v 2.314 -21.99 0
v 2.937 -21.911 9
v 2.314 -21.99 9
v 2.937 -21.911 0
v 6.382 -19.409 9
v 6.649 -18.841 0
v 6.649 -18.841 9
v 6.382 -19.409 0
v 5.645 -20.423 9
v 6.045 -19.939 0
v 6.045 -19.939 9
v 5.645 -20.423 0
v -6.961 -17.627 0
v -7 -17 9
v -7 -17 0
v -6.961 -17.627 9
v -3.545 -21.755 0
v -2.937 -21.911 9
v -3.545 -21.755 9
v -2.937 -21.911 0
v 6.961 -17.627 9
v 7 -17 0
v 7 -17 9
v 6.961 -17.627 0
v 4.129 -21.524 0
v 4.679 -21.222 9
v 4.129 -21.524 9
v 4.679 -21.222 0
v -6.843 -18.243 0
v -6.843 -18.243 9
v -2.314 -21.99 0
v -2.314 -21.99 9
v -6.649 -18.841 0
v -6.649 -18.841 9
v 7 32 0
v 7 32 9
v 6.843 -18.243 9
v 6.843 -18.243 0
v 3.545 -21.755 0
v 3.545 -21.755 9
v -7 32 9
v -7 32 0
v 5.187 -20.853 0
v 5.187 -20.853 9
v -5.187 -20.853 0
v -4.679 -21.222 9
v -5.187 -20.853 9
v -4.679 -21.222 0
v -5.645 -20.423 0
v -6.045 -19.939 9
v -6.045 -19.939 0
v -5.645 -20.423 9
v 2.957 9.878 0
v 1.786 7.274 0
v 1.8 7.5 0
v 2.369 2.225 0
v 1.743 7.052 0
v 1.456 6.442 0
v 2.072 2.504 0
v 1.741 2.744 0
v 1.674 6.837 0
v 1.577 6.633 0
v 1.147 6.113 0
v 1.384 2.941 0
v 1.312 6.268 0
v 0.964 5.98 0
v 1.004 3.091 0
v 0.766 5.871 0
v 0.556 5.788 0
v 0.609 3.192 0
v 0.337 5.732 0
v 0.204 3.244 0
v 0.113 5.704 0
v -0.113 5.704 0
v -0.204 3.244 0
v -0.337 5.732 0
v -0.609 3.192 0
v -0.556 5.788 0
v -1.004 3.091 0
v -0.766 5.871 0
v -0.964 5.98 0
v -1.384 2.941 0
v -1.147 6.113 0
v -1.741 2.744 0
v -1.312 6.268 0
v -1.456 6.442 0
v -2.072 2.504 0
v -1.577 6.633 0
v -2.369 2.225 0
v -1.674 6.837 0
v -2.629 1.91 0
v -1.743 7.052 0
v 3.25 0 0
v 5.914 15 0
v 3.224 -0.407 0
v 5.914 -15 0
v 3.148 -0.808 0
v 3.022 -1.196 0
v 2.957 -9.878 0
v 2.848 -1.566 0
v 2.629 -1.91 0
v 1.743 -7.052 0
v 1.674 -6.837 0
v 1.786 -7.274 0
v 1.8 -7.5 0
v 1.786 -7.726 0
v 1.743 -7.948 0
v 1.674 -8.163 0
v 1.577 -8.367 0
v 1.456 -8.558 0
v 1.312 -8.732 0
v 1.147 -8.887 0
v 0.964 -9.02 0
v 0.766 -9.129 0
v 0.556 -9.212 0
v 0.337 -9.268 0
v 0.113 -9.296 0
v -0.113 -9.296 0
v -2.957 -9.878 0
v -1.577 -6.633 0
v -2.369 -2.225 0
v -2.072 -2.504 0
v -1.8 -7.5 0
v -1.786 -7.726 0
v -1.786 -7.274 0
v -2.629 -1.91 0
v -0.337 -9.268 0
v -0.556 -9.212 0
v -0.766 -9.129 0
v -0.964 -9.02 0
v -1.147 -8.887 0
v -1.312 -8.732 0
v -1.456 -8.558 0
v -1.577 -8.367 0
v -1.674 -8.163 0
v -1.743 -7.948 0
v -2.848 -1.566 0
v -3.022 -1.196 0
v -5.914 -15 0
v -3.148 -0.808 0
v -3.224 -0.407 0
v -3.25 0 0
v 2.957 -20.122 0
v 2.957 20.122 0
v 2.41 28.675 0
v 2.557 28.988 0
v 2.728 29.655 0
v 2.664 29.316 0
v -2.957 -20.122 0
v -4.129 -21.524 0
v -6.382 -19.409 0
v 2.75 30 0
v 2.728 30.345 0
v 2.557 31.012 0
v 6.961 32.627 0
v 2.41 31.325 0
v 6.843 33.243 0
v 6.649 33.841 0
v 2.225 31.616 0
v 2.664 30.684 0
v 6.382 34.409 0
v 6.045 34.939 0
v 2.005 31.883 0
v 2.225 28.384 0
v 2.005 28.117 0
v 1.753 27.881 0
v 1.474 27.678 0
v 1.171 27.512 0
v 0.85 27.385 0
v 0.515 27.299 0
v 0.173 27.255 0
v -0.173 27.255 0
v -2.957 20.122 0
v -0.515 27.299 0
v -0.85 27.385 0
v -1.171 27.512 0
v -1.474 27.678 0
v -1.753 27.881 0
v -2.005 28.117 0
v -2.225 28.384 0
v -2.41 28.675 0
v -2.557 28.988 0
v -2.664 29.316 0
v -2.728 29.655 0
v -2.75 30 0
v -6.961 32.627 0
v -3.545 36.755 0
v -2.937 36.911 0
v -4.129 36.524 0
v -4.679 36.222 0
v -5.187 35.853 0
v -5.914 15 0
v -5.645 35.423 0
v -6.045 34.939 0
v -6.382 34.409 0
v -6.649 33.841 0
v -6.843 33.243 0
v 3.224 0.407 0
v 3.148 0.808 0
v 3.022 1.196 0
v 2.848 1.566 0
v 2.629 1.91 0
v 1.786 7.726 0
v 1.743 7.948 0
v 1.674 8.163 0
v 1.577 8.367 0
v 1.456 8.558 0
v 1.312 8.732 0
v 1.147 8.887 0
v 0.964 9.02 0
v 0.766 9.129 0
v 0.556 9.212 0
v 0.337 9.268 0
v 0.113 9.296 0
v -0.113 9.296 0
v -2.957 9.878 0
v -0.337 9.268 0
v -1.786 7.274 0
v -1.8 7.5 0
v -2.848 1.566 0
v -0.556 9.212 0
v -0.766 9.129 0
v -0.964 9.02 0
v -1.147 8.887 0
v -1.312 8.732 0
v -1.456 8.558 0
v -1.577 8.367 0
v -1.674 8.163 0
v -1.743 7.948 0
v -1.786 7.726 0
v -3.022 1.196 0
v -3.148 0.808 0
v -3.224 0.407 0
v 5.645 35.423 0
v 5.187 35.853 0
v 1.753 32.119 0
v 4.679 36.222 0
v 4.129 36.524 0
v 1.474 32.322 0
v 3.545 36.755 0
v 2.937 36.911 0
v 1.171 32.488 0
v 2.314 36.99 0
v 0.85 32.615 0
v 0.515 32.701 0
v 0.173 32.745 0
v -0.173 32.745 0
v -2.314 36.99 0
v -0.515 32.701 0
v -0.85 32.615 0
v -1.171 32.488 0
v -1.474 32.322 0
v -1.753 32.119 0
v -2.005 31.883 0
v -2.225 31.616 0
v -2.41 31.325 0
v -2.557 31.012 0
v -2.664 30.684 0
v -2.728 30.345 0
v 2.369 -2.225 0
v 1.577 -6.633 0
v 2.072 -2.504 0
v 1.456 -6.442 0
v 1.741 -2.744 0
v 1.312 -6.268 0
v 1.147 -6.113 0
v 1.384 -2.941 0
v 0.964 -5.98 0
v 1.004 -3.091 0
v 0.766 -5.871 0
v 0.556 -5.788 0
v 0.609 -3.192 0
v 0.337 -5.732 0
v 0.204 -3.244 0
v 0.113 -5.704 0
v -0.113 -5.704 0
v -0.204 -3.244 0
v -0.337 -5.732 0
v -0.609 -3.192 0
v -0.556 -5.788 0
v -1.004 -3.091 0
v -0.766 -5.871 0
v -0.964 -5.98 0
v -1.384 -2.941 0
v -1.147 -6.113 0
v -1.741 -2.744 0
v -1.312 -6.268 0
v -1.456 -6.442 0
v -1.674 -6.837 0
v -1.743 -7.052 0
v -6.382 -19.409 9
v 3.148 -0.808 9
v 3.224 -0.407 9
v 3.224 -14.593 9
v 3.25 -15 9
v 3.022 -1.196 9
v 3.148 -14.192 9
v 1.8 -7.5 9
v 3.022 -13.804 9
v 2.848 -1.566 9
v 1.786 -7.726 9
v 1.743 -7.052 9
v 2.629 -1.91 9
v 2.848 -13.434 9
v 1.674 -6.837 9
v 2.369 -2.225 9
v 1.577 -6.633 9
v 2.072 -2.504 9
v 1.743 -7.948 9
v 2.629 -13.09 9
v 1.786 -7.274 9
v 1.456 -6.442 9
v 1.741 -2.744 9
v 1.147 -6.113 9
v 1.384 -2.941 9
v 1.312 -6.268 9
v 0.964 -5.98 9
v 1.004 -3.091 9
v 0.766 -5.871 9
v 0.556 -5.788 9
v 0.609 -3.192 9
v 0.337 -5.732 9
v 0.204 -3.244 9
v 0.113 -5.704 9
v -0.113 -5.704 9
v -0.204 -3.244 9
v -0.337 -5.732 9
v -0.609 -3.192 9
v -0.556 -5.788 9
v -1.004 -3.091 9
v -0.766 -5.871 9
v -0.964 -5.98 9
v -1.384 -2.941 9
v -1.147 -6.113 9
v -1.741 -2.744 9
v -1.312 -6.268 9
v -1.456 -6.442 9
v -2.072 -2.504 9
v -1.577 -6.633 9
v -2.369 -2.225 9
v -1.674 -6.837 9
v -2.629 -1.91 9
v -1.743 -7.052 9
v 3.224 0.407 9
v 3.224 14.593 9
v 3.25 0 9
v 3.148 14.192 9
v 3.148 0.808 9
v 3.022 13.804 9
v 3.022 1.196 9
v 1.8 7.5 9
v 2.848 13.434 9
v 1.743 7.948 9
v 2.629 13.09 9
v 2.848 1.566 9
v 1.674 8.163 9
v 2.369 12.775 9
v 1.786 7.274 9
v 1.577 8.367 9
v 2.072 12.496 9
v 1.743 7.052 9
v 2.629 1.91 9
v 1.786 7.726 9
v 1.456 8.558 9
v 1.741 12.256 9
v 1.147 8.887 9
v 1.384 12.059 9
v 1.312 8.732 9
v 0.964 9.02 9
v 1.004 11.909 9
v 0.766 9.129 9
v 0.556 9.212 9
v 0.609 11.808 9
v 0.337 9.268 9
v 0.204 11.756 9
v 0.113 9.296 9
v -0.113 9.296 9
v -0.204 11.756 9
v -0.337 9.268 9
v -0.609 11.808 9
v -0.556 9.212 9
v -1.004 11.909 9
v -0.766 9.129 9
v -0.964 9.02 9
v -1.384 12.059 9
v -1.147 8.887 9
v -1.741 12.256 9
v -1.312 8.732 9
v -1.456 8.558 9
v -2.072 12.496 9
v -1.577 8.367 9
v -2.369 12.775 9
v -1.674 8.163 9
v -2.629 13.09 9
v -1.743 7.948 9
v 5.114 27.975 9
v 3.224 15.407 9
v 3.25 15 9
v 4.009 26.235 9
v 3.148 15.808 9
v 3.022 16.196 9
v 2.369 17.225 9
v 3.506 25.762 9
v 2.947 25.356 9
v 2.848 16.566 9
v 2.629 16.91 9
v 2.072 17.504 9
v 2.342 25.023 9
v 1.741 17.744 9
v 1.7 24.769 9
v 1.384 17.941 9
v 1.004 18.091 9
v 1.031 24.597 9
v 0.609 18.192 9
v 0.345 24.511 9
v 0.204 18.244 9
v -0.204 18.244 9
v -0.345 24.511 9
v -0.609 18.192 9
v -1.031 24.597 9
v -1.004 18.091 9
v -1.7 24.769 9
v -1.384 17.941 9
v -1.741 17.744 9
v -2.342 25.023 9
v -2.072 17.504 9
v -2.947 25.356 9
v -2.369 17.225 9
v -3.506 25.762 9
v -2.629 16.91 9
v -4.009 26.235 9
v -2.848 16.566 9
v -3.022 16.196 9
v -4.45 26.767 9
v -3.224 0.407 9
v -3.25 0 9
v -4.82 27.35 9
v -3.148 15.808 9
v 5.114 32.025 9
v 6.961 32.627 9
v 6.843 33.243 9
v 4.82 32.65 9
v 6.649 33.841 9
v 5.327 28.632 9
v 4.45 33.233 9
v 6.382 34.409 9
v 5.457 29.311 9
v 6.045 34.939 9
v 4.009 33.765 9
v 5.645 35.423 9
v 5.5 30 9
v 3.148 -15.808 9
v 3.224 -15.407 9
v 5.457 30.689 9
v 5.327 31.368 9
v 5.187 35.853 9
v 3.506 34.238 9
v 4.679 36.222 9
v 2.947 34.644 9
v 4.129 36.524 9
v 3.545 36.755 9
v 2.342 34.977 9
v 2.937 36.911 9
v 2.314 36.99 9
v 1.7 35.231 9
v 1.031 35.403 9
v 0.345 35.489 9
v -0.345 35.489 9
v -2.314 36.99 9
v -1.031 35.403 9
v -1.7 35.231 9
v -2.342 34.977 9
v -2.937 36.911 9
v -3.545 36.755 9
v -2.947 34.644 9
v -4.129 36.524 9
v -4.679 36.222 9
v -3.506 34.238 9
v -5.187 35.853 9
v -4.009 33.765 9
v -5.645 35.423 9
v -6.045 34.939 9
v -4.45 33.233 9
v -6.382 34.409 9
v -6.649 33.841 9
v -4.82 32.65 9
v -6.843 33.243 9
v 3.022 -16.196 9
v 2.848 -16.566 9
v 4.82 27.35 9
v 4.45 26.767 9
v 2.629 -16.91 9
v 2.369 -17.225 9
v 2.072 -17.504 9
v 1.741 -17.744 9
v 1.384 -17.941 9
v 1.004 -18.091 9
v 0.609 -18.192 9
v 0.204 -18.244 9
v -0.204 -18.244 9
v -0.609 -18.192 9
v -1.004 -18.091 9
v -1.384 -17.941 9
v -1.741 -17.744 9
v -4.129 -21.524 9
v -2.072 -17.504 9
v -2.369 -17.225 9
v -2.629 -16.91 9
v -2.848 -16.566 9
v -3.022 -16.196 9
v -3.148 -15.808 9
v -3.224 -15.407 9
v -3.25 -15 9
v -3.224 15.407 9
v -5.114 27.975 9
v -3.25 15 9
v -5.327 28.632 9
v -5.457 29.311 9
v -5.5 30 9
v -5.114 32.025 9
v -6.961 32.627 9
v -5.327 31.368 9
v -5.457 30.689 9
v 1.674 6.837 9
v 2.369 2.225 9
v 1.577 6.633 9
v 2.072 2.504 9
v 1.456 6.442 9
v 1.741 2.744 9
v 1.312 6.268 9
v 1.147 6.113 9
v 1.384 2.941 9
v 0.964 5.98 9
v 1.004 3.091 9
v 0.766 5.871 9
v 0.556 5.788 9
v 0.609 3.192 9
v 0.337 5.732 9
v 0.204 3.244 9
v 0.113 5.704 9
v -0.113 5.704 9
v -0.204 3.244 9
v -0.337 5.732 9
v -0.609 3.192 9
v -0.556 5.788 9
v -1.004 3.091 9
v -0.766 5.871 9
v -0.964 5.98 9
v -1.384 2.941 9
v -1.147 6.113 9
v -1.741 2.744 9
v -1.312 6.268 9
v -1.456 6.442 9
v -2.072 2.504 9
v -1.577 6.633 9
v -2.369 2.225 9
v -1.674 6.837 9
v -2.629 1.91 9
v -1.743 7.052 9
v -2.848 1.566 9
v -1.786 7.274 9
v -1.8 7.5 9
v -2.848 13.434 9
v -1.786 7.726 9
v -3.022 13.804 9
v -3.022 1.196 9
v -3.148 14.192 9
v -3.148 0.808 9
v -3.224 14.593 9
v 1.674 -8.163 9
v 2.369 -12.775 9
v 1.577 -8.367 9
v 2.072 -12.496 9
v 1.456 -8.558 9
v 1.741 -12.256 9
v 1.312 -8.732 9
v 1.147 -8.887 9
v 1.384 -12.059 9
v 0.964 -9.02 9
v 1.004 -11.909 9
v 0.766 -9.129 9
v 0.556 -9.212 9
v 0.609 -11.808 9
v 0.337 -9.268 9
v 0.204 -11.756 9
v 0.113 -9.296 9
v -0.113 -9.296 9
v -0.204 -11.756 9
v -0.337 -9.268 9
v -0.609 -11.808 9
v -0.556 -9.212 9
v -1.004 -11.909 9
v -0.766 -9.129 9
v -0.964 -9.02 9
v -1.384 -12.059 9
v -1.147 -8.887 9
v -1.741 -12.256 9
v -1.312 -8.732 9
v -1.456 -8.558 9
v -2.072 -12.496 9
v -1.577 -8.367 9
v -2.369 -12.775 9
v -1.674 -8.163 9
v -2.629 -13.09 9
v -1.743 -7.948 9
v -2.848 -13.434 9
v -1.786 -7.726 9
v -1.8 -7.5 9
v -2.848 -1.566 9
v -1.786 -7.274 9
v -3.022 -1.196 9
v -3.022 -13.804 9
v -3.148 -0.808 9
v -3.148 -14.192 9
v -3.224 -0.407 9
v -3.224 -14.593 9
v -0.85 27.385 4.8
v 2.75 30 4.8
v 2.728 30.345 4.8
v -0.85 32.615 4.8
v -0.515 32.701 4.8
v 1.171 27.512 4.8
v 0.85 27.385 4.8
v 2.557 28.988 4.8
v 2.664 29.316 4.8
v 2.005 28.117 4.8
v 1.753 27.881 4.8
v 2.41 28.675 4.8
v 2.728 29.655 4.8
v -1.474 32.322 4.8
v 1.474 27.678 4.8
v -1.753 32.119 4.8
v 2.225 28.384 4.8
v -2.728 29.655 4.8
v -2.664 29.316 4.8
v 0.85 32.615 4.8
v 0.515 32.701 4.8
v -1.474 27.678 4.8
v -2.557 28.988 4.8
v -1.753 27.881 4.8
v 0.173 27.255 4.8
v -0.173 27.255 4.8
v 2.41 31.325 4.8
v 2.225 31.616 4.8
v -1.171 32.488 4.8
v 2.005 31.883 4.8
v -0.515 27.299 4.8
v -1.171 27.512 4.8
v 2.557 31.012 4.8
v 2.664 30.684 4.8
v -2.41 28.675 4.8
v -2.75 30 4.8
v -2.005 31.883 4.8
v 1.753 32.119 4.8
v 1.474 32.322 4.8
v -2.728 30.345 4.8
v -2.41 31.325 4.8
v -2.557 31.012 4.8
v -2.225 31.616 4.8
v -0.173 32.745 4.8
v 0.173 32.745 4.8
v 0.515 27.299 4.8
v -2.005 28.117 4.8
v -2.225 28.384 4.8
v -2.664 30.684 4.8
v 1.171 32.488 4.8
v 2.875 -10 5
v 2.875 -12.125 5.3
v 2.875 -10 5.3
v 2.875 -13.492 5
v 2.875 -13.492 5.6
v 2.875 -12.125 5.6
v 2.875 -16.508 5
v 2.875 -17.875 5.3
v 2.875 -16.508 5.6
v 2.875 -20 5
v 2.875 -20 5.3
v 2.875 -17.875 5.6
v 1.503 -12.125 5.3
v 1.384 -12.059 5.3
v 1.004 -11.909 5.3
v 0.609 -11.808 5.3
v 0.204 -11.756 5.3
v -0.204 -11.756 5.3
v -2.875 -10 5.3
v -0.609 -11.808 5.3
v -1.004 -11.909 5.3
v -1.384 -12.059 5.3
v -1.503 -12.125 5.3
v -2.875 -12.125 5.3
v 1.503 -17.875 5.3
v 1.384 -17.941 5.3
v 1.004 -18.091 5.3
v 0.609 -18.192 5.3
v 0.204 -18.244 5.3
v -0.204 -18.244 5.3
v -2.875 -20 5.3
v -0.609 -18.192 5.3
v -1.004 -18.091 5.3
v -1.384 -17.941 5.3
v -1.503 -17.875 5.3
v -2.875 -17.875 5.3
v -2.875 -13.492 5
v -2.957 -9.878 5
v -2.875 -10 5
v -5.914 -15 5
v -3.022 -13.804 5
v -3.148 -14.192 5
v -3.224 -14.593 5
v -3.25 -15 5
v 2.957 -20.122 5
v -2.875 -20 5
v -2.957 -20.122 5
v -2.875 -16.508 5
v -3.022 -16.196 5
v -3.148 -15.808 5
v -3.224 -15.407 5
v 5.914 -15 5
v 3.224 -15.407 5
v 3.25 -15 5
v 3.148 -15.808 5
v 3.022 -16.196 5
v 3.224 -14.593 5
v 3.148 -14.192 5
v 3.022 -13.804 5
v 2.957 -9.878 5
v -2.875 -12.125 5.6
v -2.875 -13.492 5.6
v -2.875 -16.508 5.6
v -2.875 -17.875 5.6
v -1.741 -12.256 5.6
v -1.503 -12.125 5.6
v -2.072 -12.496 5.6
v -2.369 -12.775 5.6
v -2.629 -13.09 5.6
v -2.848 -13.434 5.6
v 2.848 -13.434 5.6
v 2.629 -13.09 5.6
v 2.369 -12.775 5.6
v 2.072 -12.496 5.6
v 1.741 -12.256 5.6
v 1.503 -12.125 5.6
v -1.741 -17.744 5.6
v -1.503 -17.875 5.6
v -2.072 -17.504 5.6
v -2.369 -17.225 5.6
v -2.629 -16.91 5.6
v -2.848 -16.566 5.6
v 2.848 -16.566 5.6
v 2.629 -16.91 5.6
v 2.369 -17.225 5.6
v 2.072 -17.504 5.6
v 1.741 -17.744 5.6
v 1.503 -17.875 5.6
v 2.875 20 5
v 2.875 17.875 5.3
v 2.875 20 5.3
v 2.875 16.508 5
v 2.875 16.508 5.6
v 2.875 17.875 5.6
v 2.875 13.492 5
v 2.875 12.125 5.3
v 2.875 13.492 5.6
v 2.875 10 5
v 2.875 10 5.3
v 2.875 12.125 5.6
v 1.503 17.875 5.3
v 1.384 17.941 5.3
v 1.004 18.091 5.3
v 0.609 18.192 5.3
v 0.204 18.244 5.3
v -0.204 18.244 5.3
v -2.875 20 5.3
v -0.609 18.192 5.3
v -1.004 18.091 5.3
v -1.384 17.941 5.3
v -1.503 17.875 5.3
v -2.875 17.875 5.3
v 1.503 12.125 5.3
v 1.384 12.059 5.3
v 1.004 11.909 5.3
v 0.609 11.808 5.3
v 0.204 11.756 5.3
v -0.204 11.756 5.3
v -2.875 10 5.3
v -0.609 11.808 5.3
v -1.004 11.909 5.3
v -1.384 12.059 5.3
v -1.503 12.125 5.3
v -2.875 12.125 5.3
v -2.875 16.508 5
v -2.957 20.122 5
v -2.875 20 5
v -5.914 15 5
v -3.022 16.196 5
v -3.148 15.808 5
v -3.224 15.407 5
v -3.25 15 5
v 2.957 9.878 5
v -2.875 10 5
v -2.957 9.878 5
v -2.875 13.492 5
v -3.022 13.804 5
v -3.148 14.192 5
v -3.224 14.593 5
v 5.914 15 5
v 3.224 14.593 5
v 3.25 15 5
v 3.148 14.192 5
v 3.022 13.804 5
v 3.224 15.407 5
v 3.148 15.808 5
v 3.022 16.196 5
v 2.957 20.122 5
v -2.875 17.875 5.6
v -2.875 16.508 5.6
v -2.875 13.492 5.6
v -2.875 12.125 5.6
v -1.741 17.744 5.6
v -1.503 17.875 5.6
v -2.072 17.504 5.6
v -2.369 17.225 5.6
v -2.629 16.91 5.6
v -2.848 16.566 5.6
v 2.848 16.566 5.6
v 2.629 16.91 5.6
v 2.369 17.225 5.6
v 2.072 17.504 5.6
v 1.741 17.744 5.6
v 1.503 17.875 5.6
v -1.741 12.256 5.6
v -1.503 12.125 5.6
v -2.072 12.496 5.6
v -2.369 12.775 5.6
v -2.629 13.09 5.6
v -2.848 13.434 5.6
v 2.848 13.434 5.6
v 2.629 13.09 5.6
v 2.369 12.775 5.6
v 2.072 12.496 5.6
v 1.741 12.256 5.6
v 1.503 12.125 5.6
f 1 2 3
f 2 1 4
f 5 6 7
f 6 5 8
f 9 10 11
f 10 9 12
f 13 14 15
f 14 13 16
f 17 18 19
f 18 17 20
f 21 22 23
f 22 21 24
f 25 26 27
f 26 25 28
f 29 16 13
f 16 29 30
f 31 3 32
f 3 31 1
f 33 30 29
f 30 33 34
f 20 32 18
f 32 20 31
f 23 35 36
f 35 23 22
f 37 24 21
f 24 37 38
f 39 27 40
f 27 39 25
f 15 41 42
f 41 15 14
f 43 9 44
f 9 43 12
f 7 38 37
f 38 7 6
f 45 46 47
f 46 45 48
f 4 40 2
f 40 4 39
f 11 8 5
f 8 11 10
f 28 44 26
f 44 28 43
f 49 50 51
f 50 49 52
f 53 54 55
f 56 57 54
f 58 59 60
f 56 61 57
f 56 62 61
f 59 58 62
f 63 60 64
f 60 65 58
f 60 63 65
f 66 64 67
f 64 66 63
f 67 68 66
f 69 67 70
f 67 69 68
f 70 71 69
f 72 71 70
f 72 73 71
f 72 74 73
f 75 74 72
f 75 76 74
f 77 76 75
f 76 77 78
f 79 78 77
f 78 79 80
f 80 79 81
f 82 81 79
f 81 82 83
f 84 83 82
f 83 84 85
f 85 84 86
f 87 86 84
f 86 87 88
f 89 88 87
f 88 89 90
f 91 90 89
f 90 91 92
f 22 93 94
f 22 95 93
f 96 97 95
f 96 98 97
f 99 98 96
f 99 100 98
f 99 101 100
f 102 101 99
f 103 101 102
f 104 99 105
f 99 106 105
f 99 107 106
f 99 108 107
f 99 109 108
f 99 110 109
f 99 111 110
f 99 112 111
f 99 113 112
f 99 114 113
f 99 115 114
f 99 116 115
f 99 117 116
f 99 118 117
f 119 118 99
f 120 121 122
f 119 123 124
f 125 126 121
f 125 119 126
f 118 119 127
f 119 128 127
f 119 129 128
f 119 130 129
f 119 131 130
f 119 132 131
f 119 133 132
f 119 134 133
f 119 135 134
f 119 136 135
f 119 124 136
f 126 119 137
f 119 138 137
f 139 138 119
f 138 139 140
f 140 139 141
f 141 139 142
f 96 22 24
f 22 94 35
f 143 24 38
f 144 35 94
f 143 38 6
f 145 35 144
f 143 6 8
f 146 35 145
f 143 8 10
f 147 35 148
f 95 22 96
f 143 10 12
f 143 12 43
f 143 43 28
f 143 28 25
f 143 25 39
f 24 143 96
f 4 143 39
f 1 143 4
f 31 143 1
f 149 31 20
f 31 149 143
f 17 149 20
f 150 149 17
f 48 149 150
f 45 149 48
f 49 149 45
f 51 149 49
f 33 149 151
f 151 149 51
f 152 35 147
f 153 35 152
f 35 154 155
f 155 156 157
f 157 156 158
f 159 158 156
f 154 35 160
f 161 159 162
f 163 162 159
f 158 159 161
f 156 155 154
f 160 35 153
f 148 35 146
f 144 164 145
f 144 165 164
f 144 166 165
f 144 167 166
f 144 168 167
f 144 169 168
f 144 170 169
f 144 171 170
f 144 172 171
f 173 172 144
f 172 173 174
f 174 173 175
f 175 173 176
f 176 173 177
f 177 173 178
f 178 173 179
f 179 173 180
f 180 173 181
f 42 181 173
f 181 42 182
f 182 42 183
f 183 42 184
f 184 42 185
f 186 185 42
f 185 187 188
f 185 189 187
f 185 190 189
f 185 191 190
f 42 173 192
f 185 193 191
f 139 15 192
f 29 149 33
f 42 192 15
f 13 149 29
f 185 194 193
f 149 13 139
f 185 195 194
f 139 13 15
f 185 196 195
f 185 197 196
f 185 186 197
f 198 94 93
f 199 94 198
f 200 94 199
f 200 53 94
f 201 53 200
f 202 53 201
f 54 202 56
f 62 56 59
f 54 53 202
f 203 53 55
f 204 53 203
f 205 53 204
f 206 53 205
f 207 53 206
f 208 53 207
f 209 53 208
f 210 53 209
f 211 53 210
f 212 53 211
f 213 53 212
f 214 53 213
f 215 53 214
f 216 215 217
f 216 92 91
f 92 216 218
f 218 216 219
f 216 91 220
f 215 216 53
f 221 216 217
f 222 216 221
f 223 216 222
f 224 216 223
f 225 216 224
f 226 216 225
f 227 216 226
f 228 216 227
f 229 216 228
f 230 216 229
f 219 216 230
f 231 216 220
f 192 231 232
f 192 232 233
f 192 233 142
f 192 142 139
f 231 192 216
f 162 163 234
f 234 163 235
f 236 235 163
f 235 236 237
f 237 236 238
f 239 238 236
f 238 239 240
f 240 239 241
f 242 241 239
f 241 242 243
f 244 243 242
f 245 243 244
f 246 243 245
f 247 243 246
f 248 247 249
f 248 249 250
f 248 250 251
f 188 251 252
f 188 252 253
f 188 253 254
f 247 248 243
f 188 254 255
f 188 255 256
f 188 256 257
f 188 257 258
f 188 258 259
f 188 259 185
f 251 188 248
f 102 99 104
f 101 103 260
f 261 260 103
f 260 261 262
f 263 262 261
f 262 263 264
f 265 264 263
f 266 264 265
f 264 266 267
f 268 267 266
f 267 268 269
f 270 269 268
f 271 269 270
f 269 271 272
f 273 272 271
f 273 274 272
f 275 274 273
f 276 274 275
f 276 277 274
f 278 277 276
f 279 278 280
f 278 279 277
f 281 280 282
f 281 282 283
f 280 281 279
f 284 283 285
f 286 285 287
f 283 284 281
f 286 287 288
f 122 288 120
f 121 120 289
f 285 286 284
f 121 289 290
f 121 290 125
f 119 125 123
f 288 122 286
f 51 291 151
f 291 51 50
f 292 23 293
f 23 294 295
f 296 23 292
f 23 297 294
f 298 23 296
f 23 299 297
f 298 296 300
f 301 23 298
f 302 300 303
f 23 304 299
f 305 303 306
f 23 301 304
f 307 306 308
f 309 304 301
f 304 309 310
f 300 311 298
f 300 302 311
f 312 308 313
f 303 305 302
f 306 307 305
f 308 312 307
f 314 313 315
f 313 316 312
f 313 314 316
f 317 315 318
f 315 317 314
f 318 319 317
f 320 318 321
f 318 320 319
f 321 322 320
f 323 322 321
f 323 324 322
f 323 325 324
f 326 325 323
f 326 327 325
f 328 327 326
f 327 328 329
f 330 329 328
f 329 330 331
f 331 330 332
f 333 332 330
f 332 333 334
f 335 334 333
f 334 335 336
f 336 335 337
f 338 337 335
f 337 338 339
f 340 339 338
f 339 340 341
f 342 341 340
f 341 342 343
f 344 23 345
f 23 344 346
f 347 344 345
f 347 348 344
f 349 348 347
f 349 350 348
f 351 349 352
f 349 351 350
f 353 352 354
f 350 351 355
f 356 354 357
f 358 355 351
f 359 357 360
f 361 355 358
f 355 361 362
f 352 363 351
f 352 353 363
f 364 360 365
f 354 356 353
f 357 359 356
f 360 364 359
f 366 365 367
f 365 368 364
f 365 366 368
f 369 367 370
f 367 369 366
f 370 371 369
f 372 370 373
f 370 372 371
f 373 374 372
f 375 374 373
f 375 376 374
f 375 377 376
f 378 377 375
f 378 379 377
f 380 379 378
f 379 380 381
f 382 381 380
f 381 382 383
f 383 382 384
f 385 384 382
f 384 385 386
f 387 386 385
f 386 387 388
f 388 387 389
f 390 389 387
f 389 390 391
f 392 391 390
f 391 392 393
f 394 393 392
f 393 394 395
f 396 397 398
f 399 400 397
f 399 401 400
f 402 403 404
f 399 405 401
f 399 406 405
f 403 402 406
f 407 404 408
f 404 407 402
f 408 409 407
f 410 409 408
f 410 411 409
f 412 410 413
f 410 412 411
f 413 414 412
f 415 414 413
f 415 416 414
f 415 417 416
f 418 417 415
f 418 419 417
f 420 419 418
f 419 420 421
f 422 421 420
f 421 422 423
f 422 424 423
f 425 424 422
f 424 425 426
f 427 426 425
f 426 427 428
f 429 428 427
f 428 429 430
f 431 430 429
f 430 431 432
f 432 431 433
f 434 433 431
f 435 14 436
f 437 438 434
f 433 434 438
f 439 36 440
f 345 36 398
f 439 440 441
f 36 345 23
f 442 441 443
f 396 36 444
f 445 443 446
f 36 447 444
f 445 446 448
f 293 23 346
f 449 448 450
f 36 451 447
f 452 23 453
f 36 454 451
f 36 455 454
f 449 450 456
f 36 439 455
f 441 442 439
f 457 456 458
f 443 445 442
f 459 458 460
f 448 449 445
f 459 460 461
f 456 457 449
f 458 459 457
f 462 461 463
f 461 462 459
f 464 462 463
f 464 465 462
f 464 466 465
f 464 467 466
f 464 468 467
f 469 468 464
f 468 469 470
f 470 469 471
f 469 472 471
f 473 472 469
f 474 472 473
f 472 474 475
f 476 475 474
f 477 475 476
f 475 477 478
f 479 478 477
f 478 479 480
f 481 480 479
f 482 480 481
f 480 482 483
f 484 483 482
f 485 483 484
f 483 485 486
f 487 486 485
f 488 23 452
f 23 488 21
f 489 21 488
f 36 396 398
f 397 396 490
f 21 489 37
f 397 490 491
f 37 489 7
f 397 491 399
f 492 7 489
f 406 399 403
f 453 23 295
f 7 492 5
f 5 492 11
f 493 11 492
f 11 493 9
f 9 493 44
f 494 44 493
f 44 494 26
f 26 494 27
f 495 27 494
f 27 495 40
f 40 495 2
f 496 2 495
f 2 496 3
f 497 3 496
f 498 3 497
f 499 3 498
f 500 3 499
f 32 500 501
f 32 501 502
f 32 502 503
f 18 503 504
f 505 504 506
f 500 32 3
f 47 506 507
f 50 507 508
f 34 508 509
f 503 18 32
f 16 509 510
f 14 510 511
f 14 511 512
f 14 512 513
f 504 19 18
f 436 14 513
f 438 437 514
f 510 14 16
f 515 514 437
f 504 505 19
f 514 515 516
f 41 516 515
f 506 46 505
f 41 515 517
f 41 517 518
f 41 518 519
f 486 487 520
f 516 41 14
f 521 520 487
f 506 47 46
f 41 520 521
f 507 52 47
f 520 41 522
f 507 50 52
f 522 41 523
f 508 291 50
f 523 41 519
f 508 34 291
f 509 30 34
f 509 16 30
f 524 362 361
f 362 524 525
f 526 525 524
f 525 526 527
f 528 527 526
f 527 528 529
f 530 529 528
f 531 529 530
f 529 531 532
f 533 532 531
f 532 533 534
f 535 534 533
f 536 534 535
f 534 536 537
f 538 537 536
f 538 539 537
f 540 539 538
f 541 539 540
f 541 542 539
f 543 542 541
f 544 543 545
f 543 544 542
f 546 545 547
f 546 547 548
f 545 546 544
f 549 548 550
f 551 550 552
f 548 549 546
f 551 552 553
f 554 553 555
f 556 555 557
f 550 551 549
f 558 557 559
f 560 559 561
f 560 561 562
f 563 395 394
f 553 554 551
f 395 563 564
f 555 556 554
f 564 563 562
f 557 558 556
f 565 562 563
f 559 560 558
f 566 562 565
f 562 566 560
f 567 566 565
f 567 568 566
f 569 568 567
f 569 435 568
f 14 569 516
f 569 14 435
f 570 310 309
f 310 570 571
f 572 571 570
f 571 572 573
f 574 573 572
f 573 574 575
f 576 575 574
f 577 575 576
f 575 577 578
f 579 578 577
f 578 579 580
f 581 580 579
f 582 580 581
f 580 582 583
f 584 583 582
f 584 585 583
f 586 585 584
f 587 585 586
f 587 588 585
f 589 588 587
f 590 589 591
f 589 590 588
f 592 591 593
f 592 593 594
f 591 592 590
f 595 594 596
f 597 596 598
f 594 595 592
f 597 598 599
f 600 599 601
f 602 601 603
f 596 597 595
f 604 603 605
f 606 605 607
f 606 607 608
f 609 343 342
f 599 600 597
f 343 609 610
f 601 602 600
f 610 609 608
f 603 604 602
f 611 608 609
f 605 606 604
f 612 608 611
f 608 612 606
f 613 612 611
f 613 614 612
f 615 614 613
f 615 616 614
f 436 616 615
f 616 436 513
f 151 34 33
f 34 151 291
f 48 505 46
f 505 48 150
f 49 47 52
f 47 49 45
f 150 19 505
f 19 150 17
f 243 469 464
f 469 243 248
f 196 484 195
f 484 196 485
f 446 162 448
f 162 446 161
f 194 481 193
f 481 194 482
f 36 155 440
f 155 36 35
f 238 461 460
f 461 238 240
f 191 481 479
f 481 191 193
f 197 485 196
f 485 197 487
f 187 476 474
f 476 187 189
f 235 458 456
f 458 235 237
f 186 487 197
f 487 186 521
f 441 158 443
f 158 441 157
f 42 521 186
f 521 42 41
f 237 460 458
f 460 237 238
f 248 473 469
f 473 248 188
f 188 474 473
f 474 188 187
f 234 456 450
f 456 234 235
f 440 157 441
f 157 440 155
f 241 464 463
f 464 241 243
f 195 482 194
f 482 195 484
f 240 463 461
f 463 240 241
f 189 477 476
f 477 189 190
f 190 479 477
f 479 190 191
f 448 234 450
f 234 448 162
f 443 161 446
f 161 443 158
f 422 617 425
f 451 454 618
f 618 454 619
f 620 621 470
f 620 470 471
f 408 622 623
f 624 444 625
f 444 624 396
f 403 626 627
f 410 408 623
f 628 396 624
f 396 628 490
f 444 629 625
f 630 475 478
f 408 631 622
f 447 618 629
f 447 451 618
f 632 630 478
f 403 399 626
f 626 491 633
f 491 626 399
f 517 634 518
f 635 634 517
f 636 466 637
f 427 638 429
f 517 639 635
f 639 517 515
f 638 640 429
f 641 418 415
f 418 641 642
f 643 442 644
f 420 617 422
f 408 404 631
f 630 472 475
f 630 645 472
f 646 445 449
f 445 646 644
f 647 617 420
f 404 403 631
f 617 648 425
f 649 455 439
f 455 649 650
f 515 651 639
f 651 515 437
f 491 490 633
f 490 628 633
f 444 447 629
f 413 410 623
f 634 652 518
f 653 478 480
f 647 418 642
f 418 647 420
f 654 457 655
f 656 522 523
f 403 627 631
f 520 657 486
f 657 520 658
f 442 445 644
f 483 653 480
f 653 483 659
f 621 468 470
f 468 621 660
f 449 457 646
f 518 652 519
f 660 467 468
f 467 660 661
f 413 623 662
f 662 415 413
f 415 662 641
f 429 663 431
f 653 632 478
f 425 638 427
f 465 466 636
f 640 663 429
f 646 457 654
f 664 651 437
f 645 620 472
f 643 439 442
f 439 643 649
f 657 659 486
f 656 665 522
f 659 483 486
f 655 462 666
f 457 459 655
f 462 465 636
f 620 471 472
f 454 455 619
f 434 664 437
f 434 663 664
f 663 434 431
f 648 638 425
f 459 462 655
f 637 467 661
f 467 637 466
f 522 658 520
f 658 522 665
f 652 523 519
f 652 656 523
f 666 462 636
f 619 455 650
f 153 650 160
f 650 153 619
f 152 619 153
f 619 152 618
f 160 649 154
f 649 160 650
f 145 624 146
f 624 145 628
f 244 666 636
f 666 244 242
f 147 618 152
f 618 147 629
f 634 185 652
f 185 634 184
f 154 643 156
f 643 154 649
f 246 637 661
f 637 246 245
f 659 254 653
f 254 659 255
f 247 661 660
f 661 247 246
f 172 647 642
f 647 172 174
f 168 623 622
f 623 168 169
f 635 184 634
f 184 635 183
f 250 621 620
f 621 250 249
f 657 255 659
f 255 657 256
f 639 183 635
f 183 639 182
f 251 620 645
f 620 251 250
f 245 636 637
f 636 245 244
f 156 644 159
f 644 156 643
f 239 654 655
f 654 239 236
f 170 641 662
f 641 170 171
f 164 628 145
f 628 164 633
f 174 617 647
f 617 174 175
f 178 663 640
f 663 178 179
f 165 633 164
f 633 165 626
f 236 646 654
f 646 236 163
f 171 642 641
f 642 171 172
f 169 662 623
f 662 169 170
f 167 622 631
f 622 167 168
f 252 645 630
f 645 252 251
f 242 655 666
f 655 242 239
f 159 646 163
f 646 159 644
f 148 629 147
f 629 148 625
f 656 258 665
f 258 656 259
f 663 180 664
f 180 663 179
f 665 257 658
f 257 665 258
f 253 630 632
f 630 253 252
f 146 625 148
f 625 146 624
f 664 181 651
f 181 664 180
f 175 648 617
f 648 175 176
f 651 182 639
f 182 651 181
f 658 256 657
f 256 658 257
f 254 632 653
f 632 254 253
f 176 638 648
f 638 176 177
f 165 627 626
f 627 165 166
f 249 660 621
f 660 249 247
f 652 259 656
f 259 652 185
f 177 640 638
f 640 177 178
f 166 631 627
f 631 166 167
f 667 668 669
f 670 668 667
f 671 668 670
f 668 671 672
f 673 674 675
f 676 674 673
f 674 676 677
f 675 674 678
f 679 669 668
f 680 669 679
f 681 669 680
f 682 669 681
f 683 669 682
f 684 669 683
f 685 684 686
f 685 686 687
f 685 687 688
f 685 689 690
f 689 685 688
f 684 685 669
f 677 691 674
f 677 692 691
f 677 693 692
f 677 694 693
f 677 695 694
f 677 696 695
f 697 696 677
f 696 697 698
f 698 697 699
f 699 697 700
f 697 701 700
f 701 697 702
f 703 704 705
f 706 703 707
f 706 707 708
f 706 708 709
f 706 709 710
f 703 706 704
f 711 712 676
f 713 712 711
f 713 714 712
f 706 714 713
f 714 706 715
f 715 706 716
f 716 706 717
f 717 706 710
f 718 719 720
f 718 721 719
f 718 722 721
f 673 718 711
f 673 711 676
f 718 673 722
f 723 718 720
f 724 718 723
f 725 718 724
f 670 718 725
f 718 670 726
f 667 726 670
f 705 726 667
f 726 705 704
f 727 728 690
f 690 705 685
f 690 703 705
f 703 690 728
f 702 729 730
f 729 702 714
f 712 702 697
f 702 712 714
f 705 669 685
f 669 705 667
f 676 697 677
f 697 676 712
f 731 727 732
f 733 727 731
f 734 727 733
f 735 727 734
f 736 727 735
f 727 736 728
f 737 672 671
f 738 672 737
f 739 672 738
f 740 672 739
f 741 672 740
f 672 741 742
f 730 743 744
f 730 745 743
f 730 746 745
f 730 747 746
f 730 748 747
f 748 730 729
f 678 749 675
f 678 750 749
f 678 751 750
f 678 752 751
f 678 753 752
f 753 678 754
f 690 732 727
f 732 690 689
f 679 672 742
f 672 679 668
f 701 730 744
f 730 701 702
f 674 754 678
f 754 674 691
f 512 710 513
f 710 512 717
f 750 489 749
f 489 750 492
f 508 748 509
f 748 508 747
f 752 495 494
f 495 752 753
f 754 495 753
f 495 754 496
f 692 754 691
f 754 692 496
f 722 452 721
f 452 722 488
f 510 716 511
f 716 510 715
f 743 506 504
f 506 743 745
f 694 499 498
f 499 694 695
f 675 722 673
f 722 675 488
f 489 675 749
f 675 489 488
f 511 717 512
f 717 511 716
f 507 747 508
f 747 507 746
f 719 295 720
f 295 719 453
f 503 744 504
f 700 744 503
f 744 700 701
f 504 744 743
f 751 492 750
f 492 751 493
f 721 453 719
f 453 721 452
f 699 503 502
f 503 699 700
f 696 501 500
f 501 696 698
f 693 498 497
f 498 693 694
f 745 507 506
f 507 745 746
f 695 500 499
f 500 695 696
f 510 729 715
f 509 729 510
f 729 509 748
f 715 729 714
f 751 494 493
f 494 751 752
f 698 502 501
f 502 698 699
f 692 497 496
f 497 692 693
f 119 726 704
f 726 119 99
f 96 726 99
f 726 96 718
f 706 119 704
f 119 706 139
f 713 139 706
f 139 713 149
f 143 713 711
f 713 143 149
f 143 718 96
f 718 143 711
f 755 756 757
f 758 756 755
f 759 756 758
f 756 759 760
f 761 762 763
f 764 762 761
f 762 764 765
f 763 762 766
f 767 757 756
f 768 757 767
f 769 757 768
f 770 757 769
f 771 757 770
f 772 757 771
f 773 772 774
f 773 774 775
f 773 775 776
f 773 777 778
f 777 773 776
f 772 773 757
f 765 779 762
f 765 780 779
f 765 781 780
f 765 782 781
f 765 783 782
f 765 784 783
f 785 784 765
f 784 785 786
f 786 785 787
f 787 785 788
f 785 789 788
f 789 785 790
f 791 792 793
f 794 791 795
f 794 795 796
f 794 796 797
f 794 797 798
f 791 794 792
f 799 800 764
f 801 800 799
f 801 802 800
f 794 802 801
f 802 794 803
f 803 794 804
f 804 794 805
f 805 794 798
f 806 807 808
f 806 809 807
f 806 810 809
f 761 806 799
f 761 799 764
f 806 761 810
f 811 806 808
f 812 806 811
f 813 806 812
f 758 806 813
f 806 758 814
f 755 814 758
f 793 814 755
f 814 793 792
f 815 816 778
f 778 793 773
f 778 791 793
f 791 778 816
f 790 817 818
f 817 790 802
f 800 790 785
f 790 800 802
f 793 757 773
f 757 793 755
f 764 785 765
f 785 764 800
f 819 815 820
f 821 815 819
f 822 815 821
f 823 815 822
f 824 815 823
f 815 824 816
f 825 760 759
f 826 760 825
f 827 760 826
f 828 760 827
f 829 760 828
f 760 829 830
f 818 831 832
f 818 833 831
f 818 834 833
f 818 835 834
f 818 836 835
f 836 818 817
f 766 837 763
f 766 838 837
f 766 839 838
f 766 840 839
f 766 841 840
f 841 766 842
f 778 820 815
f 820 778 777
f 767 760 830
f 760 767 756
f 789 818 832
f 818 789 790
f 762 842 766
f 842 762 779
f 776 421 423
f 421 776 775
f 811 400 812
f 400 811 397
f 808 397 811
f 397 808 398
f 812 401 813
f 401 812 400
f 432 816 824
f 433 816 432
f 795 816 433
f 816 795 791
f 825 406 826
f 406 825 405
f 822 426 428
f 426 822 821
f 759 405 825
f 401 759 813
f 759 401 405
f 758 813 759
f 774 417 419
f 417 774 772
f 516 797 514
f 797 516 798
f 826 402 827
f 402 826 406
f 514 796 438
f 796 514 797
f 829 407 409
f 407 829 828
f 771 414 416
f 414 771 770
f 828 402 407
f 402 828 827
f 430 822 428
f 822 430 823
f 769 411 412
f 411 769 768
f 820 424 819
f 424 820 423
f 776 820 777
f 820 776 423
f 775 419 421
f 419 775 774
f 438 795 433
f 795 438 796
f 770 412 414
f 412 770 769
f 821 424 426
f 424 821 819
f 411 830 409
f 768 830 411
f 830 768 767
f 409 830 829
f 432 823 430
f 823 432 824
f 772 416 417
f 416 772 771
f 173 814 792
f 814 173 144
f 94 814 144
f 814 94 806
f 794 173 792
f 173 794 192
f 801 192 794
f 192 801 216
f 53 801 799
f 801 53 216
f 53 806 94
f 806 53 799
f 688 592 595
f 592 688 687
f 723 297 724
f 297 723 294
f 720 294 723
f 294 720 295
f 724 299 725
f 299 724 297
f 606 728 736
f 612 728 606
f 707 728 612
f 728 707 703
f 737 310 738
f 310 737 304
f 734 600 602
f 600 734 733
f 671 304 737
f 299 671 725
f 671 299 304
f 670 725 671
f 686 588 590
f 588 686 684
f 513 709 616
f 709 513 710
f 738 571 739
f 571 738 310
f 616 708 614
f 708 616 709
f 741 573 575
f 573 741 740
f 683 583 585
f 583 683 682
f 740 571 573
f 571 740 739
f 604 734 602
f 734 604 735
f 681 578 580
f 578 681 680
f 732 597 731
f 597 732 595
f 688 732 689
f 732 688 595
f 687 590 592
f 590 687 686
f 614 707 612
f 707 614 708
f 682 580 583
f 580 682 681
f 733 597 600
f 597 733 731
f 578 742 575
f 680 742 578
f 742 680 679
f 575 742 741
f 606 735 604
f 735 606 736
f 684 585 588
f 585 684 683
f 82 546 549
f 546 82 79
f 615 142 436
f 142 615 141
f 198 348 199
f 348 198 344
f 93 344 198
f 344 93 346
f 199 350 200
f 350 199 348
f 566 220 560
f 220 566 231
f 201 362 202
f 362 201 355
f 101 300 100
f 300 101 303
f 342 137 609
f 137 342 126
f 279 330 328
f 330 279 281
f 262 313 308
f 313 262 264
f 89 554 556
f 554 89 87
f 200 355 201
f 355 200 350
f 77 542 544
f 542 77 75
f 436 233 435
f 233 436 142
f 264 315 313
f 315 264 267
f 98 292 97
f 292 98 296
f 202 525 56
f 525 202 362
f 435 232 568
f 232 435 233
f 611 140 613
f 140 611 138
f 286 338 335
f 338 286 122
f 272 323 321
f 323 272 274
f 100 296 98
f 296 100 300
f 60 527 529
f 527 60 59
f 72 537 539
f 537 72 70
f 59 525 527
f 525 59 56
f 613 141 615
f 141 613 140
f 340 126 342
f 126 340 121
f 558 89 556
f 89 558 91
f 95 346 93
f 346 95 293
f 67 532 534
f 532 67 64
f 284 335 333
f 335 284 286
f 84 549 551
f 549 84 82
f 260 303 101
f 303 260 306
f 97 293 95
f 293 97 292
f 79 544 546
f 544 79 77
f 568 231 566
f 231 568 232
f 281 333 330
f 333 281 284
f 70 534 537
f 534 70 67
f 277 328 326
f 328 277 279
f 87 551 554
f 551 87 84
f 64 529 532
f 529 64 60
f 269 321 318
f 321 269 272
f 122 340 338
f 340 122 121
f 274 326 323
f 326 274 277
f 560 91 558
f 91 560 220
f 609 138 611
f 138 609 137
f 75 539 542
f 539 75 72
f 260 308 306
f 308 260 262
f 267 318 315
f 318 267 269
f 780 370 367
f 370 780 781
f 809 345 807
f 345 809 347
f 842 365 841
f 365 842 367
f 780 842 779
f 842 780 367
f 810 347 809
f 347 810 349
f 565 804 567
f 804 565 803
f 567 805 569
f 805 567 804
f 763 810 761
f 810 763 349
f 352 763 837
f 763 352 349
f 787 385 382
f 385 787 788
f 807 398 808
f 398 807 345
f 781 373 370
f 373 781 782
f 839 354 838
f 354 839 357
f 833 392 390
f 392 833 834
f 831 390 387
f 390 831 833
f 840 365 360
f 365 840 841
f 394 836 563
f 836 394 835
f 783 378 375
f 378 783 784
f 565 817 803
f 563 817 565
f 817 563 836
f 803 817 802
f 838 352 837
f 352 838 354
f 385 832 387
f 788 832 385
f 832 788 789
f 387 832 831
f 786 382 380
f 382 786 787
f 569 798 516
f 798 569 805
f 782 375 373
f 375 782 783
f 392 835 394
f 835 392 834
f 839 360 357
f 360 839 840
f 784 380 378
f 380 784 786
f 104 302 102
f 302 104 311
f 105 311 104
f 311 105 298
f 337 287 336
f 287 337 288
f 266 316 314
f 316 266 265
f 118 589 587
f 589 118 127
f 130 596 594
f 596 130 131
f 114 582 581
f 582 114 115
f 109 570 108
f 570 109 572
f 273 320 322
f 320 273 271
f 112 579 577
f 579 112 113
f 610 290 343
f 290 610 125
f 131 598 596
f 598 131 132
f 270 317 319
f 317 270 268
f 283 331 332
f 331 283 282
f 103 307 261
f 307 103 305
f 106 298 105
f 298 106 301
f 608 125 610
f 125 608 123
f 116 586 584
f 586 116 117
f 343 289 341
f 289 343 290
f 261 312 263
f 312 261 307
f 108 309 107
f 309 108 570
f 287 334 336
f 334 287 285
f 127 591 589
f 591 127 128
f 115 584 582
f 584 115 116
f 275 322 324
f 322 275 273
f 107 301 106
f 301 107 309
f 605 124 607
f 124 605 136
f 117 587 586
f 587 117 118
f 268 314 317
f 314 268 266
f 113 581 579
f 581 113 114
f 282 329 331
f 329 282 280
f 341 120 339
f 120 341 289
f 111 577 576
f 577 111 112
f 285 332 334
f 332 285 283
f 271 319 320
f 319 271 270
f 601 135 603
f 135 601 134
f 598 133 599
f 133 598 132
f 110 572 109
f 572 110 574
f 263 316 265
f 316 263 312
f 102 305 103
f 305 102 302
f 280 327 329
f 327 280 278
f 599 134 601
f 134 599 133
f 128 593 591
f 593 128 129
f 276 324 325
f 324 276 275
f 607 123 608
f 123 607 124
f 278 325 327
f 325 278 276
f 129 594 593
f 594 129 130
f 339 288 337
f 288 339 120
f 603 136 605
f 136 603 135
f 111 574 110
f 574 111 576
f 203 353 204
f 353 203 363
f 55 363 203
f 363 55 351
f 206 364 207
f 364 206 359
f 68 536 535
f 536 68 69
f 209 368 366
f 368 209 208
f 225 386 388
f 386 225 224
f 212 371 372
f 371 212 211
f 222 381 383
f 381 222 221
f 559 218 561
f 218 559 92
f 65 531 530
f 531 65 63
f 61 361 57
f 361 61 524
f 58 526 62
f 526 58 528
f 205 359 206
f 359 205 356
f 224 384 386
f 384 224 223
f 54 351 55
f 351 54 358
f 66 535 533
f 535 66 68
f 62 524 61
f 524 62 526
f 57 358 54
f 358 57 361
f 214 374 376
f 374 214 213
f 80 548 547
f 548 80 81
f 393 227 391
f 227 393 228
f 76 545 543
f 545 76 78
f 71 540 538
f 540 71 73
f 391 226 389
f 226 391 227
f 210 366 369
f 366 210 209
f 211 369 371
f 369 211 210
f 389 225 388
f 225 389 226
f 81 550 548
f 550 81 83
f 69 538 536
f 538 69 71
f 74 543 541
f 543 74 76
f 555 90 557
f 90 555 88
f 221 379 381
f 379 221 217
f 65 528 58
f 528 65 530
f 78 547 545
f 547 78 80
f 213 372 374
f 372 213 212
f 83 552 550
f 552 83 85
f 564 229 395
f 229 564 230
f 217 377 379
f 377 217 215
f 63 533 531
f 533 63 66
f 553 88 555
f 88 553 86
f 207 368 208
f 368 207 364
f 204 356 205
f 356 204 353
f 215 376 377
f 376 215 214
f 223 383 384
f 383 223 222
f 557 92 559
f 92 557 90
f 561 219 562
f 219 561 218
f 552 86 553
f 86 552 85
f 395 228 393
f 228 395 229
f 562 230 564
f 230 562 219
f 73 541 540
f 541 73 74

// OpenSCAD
$fn = 50;


difference() {
	union() {
		hull() {
			translate(v = [-2.0000000000, 17.0000000000, 0]) {
				cylinder(h = 9, r = 5);
			}
			translate(v = [2.0000000000, 17.0000000000, 0]) {
				cylinder(h = 9, r = 5);
			}
			translate(v = [-2.0000000000, -17.0000000000, 0]) {
				cylinder(h = 9, r = 5);
			}
			translate(v = [2.0000000000, -17.0000000000, 0]) {
				cylinder(h = 9, r = 5);
			}
		}
		translate(v = [0.0000000000, 22.5000000000, 0]) {
			hull() {
				translate(v = [-2.0000000000, 9.5000000000, 0]) {
					cylinder(h = 9, r = 5);
				}
				translate(v = [2.0000000000, 9.5000000000, 0]) {
					cylinder(h = 9, r = 5);
				}
				translate(v = [-2.0000000000, -9.5000000000, 0]) {
					cylinder(h = 9, r = 5);
				}
				translate(v = [2.0000000000, -9.5000000000, 0]) {
					cylinder(h = 9, r = 5);
				}
			}
		}
		translate(v = [0.0000000000, 22.5000000000, 0]) {
			hull() {
				translate(v = [-2.0000000000, 9.5000000000, 0]) {
					cylinder(h = 9, r = 5);
				}
				translate(v = [2.0000000000, 9.5000000000, 0]) {
					cylinder(h = 9, r = 5);
				}
				translate(v = [-2.0000000000, -9.5000000000, 0]) {
					cylinder(h = 9, r = 5);
				}
				translate(v = [2.0000000000, -9.5000000000, 0]) {
					cylinder(h = 9, r = 5);
				}
			}
		}
	}
	union() {
		translate(v = [0.0000000000, 30.0000000000, 9]) {
			rotate(a = [0, 0, 0]) {
				difference() {
					union() {
						#translate(v = [0, 0, -9.0000000000]) {
							cylinder(h = 9, r = 2.2500000000);
						}
						#translate(v = [0, 0, -4.2000000000]) {
							cylinder(h = 4.2000000000, r1 = 2.7500000000, r2 = 5.5000000000);
						}
						#translate(v = [0, 0, -9.0000000000]) {
							cylinder(h = 9, r = 2.7500000000);
						}
						#translate(v = [0, 0, -9.0000000000]) {
							cylinder(h = 9, r = 2.2500000000);
						}
					}
					union();
				}
			}
		}
		translate(v = [0.0000000000, 30.0000000000, 9]) {
			rotate(a = [0, 0, 0]) {
				difference() {
					union() {
						#translate(v = [0, 0, -9.0000000000]) {
							cylinder(h = 9, r = 2.2500000000);
						}
						#translate(v = [0, 0, -4.2000000000]) {
							cylinder(h = 4.2000000000, r1 = 2.7500000000, r2 = 5.5000000000);
						}
						#translate(v = [0, 0, -9.0000000000]) {
							cylinder(h = 9, r = 2.7500000000);
						}
						#translate(v = [0, 0, -9.0000000000]) {
							cylinder(h = 9, r = 2.2500000000);
						}
					}
					union();
				}
			}
		}
		translate(v = [0.0000000000, -15.0000000000, 0]) {
			rotate(a = [0, 0, 0]) {
				difference() {
					union() {
						#translate(v = [-2.8750000000, -5.0000000000, -0.3000000000]) {
							cube(size = [5.7500000000, 10, 0.3000000000]);
						}
						#translate(v = [-2.8750000000, -2.8750000000, -0.6000000000]) {
							cube(size = [5.7500000000, 5.7500000000, 0.3000000000]);
						}
						#translate(v = [-2.8750000000, -5.0000000000, 5]) {
							cube(size = [5.7500000000, 10, 0.3000000000]);
						}
						#translate(v = [-2.8750000000, -2.8750000000, 5.3000000000]) {
							cube(size = [5.7500000000, 5.7500000000, 0.3000000000]);
						}
						#translate(v = [0, 0, -100.0000000000]) {
							cylinder(h = 200, r = 3.2500000000);
						}
						#linear_extrude(height = 5) {
							polygon(points = [[5.9142500000, 0.0000000000], [2.9571250000, 5.1218907443], [-2.9571250000, 5.1218907443], [-5.9142500000, 0.0000000000], [-2.9571250000, -5.1218907443], [2.9571250000, -5.1218907443]]);
						}
						#translate(v = [-2.8750000000, -5.0000000000, -0.3000000000]) {
							cube(size = [5.7500000000, 10, 0.3000000000]);
						}
						#translate(v = [-2.8750000000, -2.8750000000, -0.6000000000]) {
							cube(size = [5.7500000000, 5.7500000000, 0.3000000000]);
						}
						#translate(v = [-2.8750000000, -5.0000000000, 5]) {
							cube(size = [5.7500000000, 10, 0.3000000000]);
						}
						#translate(v = [-2.8750000000, -2.8750000000, 5.3000000000]) {
							cube(size = [5.7500000000, 5.7500000000, 0.3000000000]);
						}
						#translate(v = [0, 0, -100.0000000000]) {
							cylinder(h = 200, r = 3.2500000000);
						}
						#translate(v = [-2.8750000000, -5.0000000000, -0.3000000000]) {
							cube(size = [5.7500000000, 10, 0.3000000000]);
						}
						#translate(v = [-2.8750000000, -2.8750000000, -0.6000000000]) {
							cube(size = [5.7500000000, 5.7500000000, 0.3000000000]);
						}
						#translate(v = [-2.8750000000, -5.0000000000, 5]) {
							cube(size = [5.7500000000, 10, 0.3000000000]);
						}
						#translate(v = [-2.8750000000, -2.8750000000, 5.3000000000]) {
							cube(size = [5.7500000000, 5.7500000000, 0.3000000000]);
						}
						#translate(v = [0, 0, -100.0000000000]) {
							cylinder(h = 200, r = 3.2500000000);
						}
					}
					union();
				}
			}
		}
		translate(v = [0.0000000000, 15.0000000000, 0]) {
			rotate(a = [0, 0, 0]) {
				difference() {
					union() {
						#translate(v = [-2.8750000000, -5.0000000000, -0.3000000000]) {
							cube(size = [5.7500000000, 10, 0.3000000000]);
						}
						#translate(v = [-2.8750000000, -2.8750000000, -0.6000000000]) {
							cube(size = [5.7500000000, 5.7500000000, 0.3000000000]);
						}
						#translate(v = [-2.8750000000, -5.0000000000, 5]) {
							cube(size = [5.7500000000, 10, 0.3000000000]);
						}
						#translate(v = [-2.8750000000, -2.8750000000, 5.3000000000]) {
							cube(size = [5.7500000000, 5.7500000000, 0.3000000000]);
						}
						#translate(v = [0, 0, -100.0000000000]) {
							cylinder(h = 200, r = 3.2500000000);
						}
						#linear_extrude(height = 5) {
							polygon(points = [[5.9142500000, 0.0000000000], [2.9571250000, 5.1218907443], [-2.9571250000, 5.1218907443], [-5.9142500000, 0.0000000000], [-2.9571250000, -5.1218907443], [2.9571250000, -5.1218907443]]);
						}
						#translate(v = [-2.8750000000, -5.0000000000, -0.3000000000]) {
							cube(size = [5.7500000000, 10, 0.3000000000]);
						}
						#translate(v = [-2.8750000000, -2.8750000000, -0.6000000000]) {
							cube(size = [5.7500000000, 5.7500000000, 0.3000000000]);
						}
						#translate(v = [-2.8750000000, -5.0000000000, 5]) {
							cube(size = [5.7500000000, 10, 0.3000000000]);
						}
						#translate(v = [-2.8750000000, -2.8750000000, 5.3000000000]) {
							cube(size = [5.7500000000, 5.7500000000, 0.3000000000]);
						}
						#translate(v = [0, 0, -100.0000000000]) {
							cylinder(h = 200, r = 3.2500000000);
						}
						#translate(v = [-2.8750000000, -5.0000000000, -0.3000000000]) {
							cube(size = [5.7500000000, 10, 0.3000000000]);
						}
						#translate(v = [-2.8750000000, -2.8750000000, -0.6000000000]) {
							cube(size = [5.7500000000, 5.7500000000, 0.3000000000]);
						}
						#translate(v = [-2.8750000000, -5.0000000000, 5]) {
							cube(size = [5.7500000000, 10, 0.3000000000]);
						}
						#translate(v = [-2.8750000000, -2.8750000000, 5.3000000000]) {
							cube(size = [5.7500000000, 5.7500000000, 0.3000000000]);
						}
						#translate(v = [0, 0, -100.0000000000]) {
							cylinder(h = 200, r = 3.2500000000);
						}
					}
					union();
				}
			}
		}
		translate(v = [0.0000000000, -15.0000000000, 0]) {
			translate(v = [0, 0, -100]) {
				cylinder(h = 200, r = 3.2500000000);
			}
		}
		translate(v = [0, 0, -100]) {
			cylinder(h = 200, r = 3.2500000000);
		}
		translate(v = [0.0000000000, 15.0000000000, 0]) {
			translate(v = [0, 0, -100]) {
				cylinder(h = 200, r = 3.2500000000);
			}
		}
		translate(v = [0.0000000000, -15.0000000000, 0]) {
			translate(v = [0, 0, -100]) {
				cylinder(h = 200, r = 1.8000000000);
			}
		}
		translate(v = [0.0000000000, -7.5000000000, 0]) {
			translate(v = [0, 0, -100]) {
				cylinder(h = 200, r = 1.8000000000);
			}
		}
		translate(v = [0, 0, -100]) {
			cylinder(h = 200, r = 1.8000000000);
		}
		translate(v = [0.0000000000, 7.5000000000, 0]) {
			translate(v = [0, 0, -100]) {
				cylinder(h = 200, r = 1.8000000000);
			}
		}
		translate(v = [0.0000000000, 15.0000000000, 0]) {
			translate(v = [0, 0, -100]) {
				cylinder(h = 200, r = 1.8000000000);
			}
		}
	}
}
